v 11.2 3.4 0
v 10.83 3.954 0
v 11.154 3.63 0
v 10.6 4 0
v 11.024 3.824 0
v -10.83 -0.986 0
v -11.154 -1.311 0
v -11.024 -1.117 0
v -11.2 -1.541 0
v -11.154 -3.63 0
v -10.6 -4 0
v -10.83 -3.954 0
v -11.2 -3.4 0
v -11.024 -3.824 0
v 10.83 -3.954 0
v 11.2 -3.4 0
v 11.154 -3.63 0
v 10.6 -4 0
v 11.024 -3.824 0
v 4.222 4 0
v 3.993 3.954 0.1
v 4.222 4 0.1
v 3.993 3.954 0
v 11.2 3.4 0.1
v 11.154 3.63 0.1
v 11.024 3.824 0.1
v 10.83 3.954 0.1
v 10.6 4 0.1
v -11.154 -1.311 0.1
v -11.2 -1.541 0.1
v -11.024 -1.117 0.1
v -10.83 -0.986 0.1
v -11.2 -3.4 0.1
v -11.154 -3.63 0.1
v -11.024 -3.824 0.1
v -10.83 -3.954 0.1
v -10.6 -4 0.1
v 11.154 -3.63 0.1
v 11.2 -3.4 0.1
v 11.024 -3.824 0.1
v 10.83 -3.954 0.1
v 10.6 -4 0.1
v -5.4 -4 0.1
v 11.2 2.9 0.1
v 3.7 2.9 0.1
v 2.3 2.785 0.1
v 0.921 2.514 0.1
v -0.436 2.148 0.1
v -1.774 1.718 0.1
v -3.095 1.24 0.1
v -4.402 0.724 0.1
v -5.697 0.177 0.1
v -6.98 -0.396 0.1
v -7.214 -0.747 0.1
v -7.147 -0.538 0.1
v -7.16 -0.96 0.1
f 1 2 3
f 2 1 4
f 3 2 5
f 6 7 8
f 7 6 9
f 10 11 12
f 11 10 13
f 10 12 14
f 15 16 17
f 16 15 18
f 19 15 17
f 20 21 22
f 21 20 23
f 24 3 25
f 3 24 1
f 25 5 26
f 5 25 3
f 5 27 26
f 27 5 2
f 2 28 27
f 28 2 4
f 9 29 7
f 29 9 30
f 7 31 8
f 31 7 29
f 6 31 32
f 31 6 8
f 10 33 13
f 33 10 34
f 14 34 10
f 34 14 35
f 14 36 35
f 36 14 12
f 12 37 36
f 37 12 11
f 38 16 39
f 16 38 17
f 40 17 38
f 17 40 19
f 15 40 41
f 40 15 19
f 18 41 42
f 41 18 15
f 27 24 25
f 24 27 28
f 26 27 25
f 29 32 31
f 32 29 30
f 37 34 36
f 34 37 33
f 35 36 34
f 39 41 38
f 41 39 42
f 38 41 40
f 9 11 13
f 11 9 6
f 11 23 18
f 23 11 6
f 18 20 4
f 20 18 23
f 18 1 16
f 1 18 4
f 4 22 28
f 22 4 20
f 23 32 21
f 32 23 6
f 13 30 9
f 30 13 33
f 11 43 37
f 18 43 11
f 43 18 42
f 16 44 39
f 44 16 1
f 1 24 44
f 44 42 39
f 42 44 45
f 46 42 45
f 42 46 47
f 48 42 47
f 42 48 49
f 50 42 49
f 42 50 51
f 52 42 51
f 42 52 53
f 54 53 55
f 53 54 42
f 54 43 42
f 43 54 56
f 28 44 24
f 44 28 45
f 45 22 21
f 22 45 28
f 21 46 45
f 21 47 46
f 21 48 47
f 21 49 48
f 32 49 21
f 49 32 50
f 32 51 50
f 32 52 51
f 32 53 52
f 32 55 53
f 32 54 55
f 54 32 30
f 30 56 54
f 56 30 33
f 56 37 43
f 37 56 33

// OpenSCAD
// file: ../p/empty.scad
use <../lib.scad>
function ldraw_lib__empty() = [
// 0 Empty
// 0 Name: empty.dat
// 0 Author: Steffen [Steffen]
// 0 !LDRAW_ORG Primitive UPDATE 2015-01
// 0 !LICENSE Licensed under CC BY 4.0 : see CAreadme.txt
// 
// 0 BFC CERTIFY CCW
  [0,"BFC","CERTIFY"],
  [0,"BFC","CCW"],
// 
// 0 !HISTORY 2015-10-11 [PTadmin] Official Update 2015-01
// 
// 
// 0 // Tool MLCad cannot handle really empty files. This file is used as a workaround.
// 0 // It exceptionally contains forbidden non-LDRAW standard syntax to satisfy MLCad until it is fixed OR a different editor has become the de-facto LDRAW standard.
// 0 // The line being used here is an "impossible" conditional line which never should be visible,
// 0 // additionally hidden by a syntax explicitly hiding it from displaying.
// 
// 0 MLCAD HIDE 5 24 0 0 0 0.0001 0 0 0.0001 -0.0001 0 0 0 0
];
module ldraw_lib__empty(step=0, col=false, unit=2/5, alt=false, line=0.2, solid=!$preview)
    makepoly(ldraw_lib__empty(), step=step, col=col, unit=unit, alt=alt, line=line, solid=solid);
ldraw_lib__empty(line=0.2);
// file: ../p/3-16cyli.scad
use <../lib.scad>
function ldraw_lib__3_16cyli() = [
// 0 Cylinder 0.1875
// 0 Name: 3-16cyli.dat
// 0 Author: Mark Kennedy [mkennedy]
// 0 !LDRAW_ORG Primitive UPDATE 2005-01
// 0 !LICENSE Licensed under CC BY 4.0 : see CAreadme.txt
// 
// 0 BFC CERTIFY CCW
  [0,"BFC","CERTIFY"],
  [0,"BFC","CCW"],
// 
// 0 !HISTORY 2004-03-02 [PTadmin] Official Update 2004-01
// 0 !HISTORY 2004-12-11 [nielsk] Recreated using Primitive Generator, Edge lines fixed, BFC changed to CCW
// 0 !HISTORY 2005-12-28 [PTadmin] Official Update 2005-01
// 0 !HISTORY 2007-06-24 [PTadmin] Header formatted for Contributor Agreement
// 0 !HISTORY 2008-07-01 [PTadmin] Official Update 2008-01
// 
// 
// 4 16 .9239 1 .3827 .9239 0 .3827 1 0 0 1 1 0
  [4,16,.9239,1,.3827,.9239,0,.3827,1,0,0,1,1,0],
// 4 16 .7071 1 .7071 .7071 0 .7071 .9239 0 .3827 .9239 1 .3827
  [4,16,.7071,1,.7071,.7071,0,.7071,.9239,0,.3827,.9239,1,.3827],
// 4 16 .3827 1 .9239 .3827 0 .9239 .7071 0 .7071 .7071 1 .7071
  [4,16,.3827,1,.9239,.3827,0,.9239,.7071,0,.7071,.7071,1,.7071],
// 5 24 1 1 0 1 0 0 1 1 -.4142 .9239 1 .3827
  [5,24,1,1,0,1,0,0,1,1,-.4142,.9239,1,.3827],
// 5 24 .9239 1 .3827 .9239 0 .3827 1 1 0 .7071 1 .7071
  [5,24,.9239,1,.3827,.9239,0,.3827,1,1,0,.7071,1,.7071],
// 5 24 .7071 1 .7071 .7071 0 .7071 .9239 1 .3827 .3827 1 .9239
  [5,24,.7071,1,.7071,.7071,0,.7071,.9239,1,.3827,.3827,1,.9239],
// 5 24 .3827 1 .9239 .3827 0 .9239 .7071 1 .7071 0 1 1.0824
  [5,24,.3827,1,.9239,.3827,0,.9239,.7071,1,.7071,0,1,1.0824],
// 0
];
module ldraw_lib__3_16cyli(step=0, col=false, unit=2/5, alt=false, line=0.2, solid=!$preview)
    makepoly(ldraw_lib__3_16cyli(), step=step, col=col, unit=unit, alt=alt, line=line, solid=solid);
ldraw_lib__3_16cyli(line=0.2);
// file: ../p/3-16chrd.scad
use <../lib.scad>
function ldraw_lib__3_16chrd() = [
// 0 Chord 0.1875
// 0 Name: 3-16chrd.dat
// 0 Author: Niels Karsdorp [nielsk]
// 0 !LDRAW_ORG Primitive UPDATE 2009-01
// 0 !LICENSE Licensed under CC BY 4.0 : see CAreadme.txt
// 
// 0 BFC CERTIFY CCW
  [0,"BFC","CERTIFY"],
  [0,"BFC","CCW"],
// 
// 0 !HISTORY 2009-05-02 [PTadmin] Official Update 2009-01
// 
// 
// 4 16 1 0 0 0.9239 0 0.3827 0.7071 0 0.7071 0.3827 0 0.9239
  [4,16,1,0,0,0.9239,0,0.3827,0.7071,0,0.7071,0.3827,0,0.9239],
// 0
// 
];
module ldraw_lib__3_16chrd(step=0, col=false, unit=2/5, alt=false, line=0.2, solid=!$preview)
    makepoly(ldraw_lib__3_16chrd(), step=step, col=col, unit=unit, alt=alt, line=line, solid=solid);
ldraw_lib__3_16chrd(line=0.2);
// file: ../p/1-4cyli.scad
use <../lib.scad>
function ldraw_lib__1_4cyli() = [
// 0 Cylinder 0.25
// 0 Name: 1-4cyli.dat
// 0 Author: James Jessiman
// 0 !LDRAW_ORG Primitive UPDATE 2012-01
// 0 !LICENSE Licensed under CC BY 4.0 : see CAreadme.txt
// 
// 0 BFC CERTIFY CCW
  [0,"BFC","CERTIFY"],
  [0,"BFC","CCW"],
// 
// 0 !HISTORY 2002-03-23 [sbliss] Added BFC statement.
// 0 !HISTORY 2002-04-25 [PTadmin] Official Update 2002-02
// 0 !HISTORY 2007-06-22 [PTadmin] Header formatted for Contributor Agreement
// 0 !HISTORY 2008-07-01 [PTadmin] Official Update 2008-01
// 0 !HISTORY 2012-02-16 [Philo] Changed to CCW
// 0 !HISTORY 2012-03-30 [PTadmin] Official Update 2012-01
// 
// 
// 4 16 1 1 0 0.9239 1 0.3827 0.9239 0 0.3827 1 0 0
  [4,16,1,1,0,0.9239,1,0.3827,0.9239,0,0.3827,1,0,0],
// 5 24 1 0 0 1 1 0 0.9239 0 0.3827 1 0 -1
  [5,24,1,0,0,1,1,0,0.9239,0,0.3827,1,0,-1],
// 4 16 0.9239 1 0.3827 0.7071 1 0.7071 0.7071 0 0.7071 0.9239 0 0.3827
  [4,16,0.9239,1,0.3827,0.7071,1,0.7071,0.7071,0,0.7071,0.9239,0,0.3827],
// 5 24 0.9239 0 0.3827 0.9239 1 0.3827 0.7071 0 0.7071 1 0 0
  [5,24,0.9239,0,0.3827,0.9239,1,0.3827,0.7071,0,0.7071,1,0,0],
// 4 16 0.7071 1 0.7071 0.3827 1 0.9239 0.3827 0 0.9239 0.7071 0 0.7071
  [4,16,0.7071,1,0.7071,0.3827,1,0.9239,0.3827,0,0.9239,0.7071,0,0.7071],
// 5 24 0.7071 0 0.7071 0.7071 1 0.7071 0.3827 0 0.9239 0.9239 0 0.3827
  [5,24,0.7071,0,0.7071,0.7071,1,0.7071,0.3827,0,0.9239,0.9239,0,0.3827],
// 4 16 0.3827 1 0.9239 0 1 1 0 0 1 0.3827 0 0.9239
  [4,16,0.3827,1,0.9239,0,1,1,0,0,1,0.3827,0,0.9239],
// 5 24 0.3827 0 0.9239 0.3827 1 0.9239 0 0 1 0.7071 0 0.7071
  [5,24,0.3827,0,0.9239,0.3827,1,0.9239,0,0,1,0.7071,0,0.7071],
// 5 24 0 0 1 0 1 1 0.3827 0 0.9239 -1 0 1
  [5,24,0,0,1,0,1,1,0.3827,0,0.9239,-1,0,1],
];
module ldraw_lib__1_4cyli(step=0, col=false, unit=2/5, alt=false, line=0.2, solid=!$preview)
    makepoly(ldraw_lib__1_4cyli(), step=step, col=col, unit=unit, alt=alt, line=line, solid=solid);
ldraw_lib__1_4cyli(line=0.2);
// file: ../p/1-4chrd.scad
use <../lib.scad>
function ldraw_lib__1_4chrd() = [
// 0 Chord 0.25
// 0 Name: 1-4chrd.dat
// 0 Author: Max Martin Richter [MMR1988]
// 0 !LDRAW_ORG Primitive UPDATE 2023-05
// 0 !LICENSE Licensed under CC BY 4.0 : see CAreadme.txt
// 
// 0 BFC CERTIFY CCW
  [0,"BFC","CERTIFY"],
  [0,"BFC","CCW"],
// 
// 0 !HISTORY 2004-04-22 [PTadmin] Official Update 2004-02
// 0 !HISTORY 2007-10-09 [PTadmin] Header formatted for Contributor Agreement
// 0 !HISTORY 2008-07-01 [PTadmin] Official Update 2008-01
// 0 !HISTORY 2012-08-02 [MMR1988] Re-creation with PrimGen2 and Rectifier
// 0 !HISTORY 2012-08-09 [PTadmin] Official Update 2012-02
// 0 !HISTORY 2023-10-27 [OrionP] Change author to MMR1988 from hafhead
// 0 !HISTORY 2023-10-31 [OrionP] Official Update 2023-05
// 
// 4 16 0.9239 0 0.3827 0.3827 0 0.9239 0 0 1 1 0 0
  [4,16,0.9239,0,0.3827,0.3827,0,0.9239,0,0,1,1,0,0],
// 3 16 0.7071 0 0.7071 0.3827 0 0.9239 0.9239 0 0.3827
  [3,16,0.7071,0,0.7071,0.3827,0,0.9239,0.9239,0,0.3827],
];
module ldraw_lib__1_4chrd(step=0, col=false, unit=2/5, alt=false, line=0.2, solid=!$preview)
    makepoly(ldraw_lib__1_4chrd(), step=step, col=col, unit=unit, alt=alt, line=line, solid=solid);
ldraw_lib__1_4chrd(line=0.2);
// file: ../p/1-16cyli.scad
use <../lib.scad>
function ldraw_lib__1_16cyli() = [
// 0 Cylinder 0.0625
// 0 Name: 1-16cyli.dat
// 0 Author: Marc Klein [marckl]
// 0 !LDRAW_ORG Primitive UPDATE 2005-01
// 0 !LICENSE Licensed under CC BY 4.0 : see CAreadme.txt
// 
// 0 BFC CERTIFY CCW
  [0,"BFC","CERTIFY"],
  [0,"BFC","CCW"],
// 
// 0 !HISTORY 2004-03-02 [PTadmin] Official Update 2004-01
// 0 !HISTORY 2004-12-11 [nielsk] Recreated using Primitive Generator, Edge lines fixed, BFC changed to CCW
// 0 !HISTORY 2005-12-28 [PTadmin] Official Update 2005-01
// 0 !HISTORY 2007-06-22 [PTadmin] Header formatted for Contributor Agreement
// 0 !HISTORY 2008-07-01 [PTadmin] Official Update 2008-01
// 
// 
// 4 16 .9239 1 .3827 .9239 0 .3827 1 0 0 1 1 0
  [4,16,.9239,1,.3827,.9239,0,.3827,1,0,0,1,1,0],
// 5 24 1 1 0 1 0 0 1 1 -.4142 .9239 1 .3827
  [5,24,1,1,0,1,0,0,1,1,-.4142,.9239,1,.3827],
// 5 24 .9239 1 .3827 .9239 0 .3827 1 1 0 .7654 1 .7654
  [5,24,.9239,1,.3827,.9239,0,.3827,1,1,0,.7654,1,.7654],
// 0
];
module ldraw_lib__1_16cyli(step=0, col=false, unit=2/5, alt=false, line=0.2, solid=!$preview)
    makepoly(ldraw_lib__1_16cyli(), step=step, col=col, unit=unit, alt=alt, line=line, solid=solid);
ldraw_lib__1_16cyli(line=0.2);
// file: ../p/1-16chrd.scad
use <../lib.scad>
use <empty.scad>
function ldraw_lib__1_16chrd() = [
// 0 Chord 0.0625
// 0 Name: 1-16chrd.dat
// 0 Author: Philippe Hurbain [Philo]
// 0 !LDRAW_ORG Primitive UPDATE 2015-01
// 0 !LICENSE Licensed under CC BY 4.0 : see CAreadme.txt
// 
// 0 BFC CERTIFY CCW
  [0,"BFC","CERTIFY"],
  [0,"BFC","CCW"],
// 
// 0 !HISTORY 2015-10-11 [PTadmin] Official Update 2015-01
// 
// 
// 0 // This file is intentionally empty because at the current \P resolution,
// 0 // an 1-16chrd is actually empty. However, this file still is present
// 0 // to allow tools to do primitives substition and fill in a real chrd here,
// 0 // or, if desired, to substitute this with the hi-res 48\1-16chrd.
// 
// 0 // This file is based on an idea by Darats at http://forums.ldraw.org/read.php?19,14500,14500#msg-14500
// 
// 1 16 0 0 0 1 0 0 0 1 0 0 0 1 empty.dat
  [1,16,0,0,0,1,0,0,0,1,0,0,0,1, ldraw_lib__empty()],
];
module ldraw_lib__1_16chrd(step=0, col=false, unit=2/5, alt=false, line=0.2, solid=!$preview)
    makepoly(ldraw_lib__1_16chrd(), step=step, col=col, unit=unit, alt=alt, line=line, solid=solid);
ldraw_lib__1_16chrd(line=0.2);
// main file
use <../lib.scad>
use <../p/1-16chrd.scad>
use <../p/1-16cyli.scad>
use <../p/1-4chrd.scad>
use <../p/1-4cyli.scad>
use <../p/3-16chrd.scad>
use <../p/3-16cyli.scad>
function ldraw_lib__6141955q() = [
// 0 Sticker  1 x  2.8 with Black Trapezoid on Blue Background Right
// 0 Name: 6141955q.dat
// 0 Author: Massimo Maso [Sirio]
// 0 !LDRAW_ORG Part UPDATE 2025-03
// 0 !LICENSE Licensed under CC BY 4.0 : see CAreadme.txt
// 
// 0 BFC CERTIFY CCW
  [0,"BFC","CERTIFY"],
  [0,"BFC","CCW"],
// 
// 0 !KEYWORDS Bricklink 75871stk01a, Brickowl 197362, Ford, GT, Mustang
// 0 !KEYWORDS Rebrickable 24746, Set 75871, Speed Champions
// 
// 0 !HISTORY 2025-03-30 [OrionP] Official Update 2025-03
// 
// 0 // Primitives
// 1 16 10.55615 0 8.5 0 0 -1.5 0 -1 0 1.5 0 0 1-16chrd.dat
  [1,16,10.55615,0,8.5,0,0,-1.5,0,-1,0,1.5,0,0, ldraw_lib__1_16chrd()],
// 1 16 26.5 0 8.5 1.5 0 0 0 -1 0 0 0 1.5 1-4chrd.dat
  [1,16,26.5,0,8.5,1.5,0,0,0,-1,0,0,0,1.5, ldraw_lib__1_4chrd()],
// 1 16 -26.5 0 -3.85205 -1.5 0 0 0 -1 0 0 0 1.5 3-16chrd.dat
  [1,16,-26.5,0,-3.85205,-1.5,0,0,0,-1,0,0,0,1.5, ldraw_lib__3_16chrd()],
// 1 16 -26.5 0 -8.5 -1.5 0 0 0 -1 0 0 0 -1.5 1-4chrd.dat
  [1,16,-26.5,0,-8.5,-1.5,0,0,0,-1,0,0,0,-1.5, ldraw_lib__1_4chrd()],
// 1 16 26.5 0 -8.5 1.5 0 0 0 -1 0 0 0 -1.5 1-4chrd.dat
  [1,16,26.5,0,-8.5,1.5,0,0,0,-1,0,0,0,-1.5, ldraw_lib__1_4chrd()],
// 1 16 10.55615 0 8.5 0 0 -1.5 0 -.25 0 1.5 0 0 1-16cyli.dat
  [1,16,10.55615,0,8.5,0,0,-1.5,0,-.25,0,1.5,0,0, ldraw_lib__1_16cyli()],
// 1 16 26.5 0 8.5 1.5 0 0 0 -.25 0 0 0 1.5 1-4cyli.dat
  [1,16,26.5,0,8.5,1.5,0,0,0,-.25,0,0,0,1.5, ldraw_lib__1_4cyli()],
// 1 16 -26.5 0 -3.85205 -1.5 0 0 0 -.25 0 0 0 1.5 3-16cyli.dat
  [1,16,-26.5,0,-3.85205,-1.5,0,0,0,-.25,0,0,0,1.5, ldraw_lib__3_16cyli()],
// 1 16 -26.5 0 -8.5 -1.5 0 0 0 -.25 0 0 0 -1.5 1-4cyli.dat
  [1,16,-26.5,0,-8.5,-1.5,0,0,0,-.25,0,0,0,-1.5, ldraw_lib__1_4cyli()],
// 1 16 26.5 0 -8.5 1.5 0 0 0 -.25 0 0 0 -1.5 1-4cyli.dat
  [1,16,26.5,0,-8.5,1.5,0,0,0,-.25,0,0,0,-1.5, ldraw_lib__1_4cyli()],
// 1 1 10.55615 -.25 8.5 0 0 -1.5 0 1 0 1.5 0 0 1-16chrd.dat
  [1,1,10.55615,-.25,8.5,0,0,-1.5,0,1,0,1.5,0,0, ldraw_lib__1_16chrd()],
// 1 1 26.5 -.25 8.5 1.5 0 0 0 1 0 0 0 1.5 1-4chrd.dat
  [1,1,26.5,-.25,8.5,1.5,0,0,0,1,0,0,0,1.5, ldraw_lib__1_4chrd()],
// 1 1 -26.5 -.25 -3.85205 -1.5 0 0 0 1 0 0 0 1.5 3-16chrd.dat
  [1,1,-26.5,-.25,-3.85205,-1.5,0,0,0,1,0,0,0,1.5, ldraw_lib__3_16chrd()],
// 1 1 -26.5 -.25 -8.5 -1.5 0 0 0 1 0 0 0 -1.5 1-4chrd.dat
  [1,1,-26.5,-.25,-8.5,-1.5,0,0,0,1,0,0,0,-1.5, ldraw_lib__1_4chrd()],
// 1 0 26.5 -.25 -8.5 1.5 0 0 0 1 0 0 0 -1.5 1-4chrd.dat
  [1,0,26.5,-.25,-8.5,1.5,0,0,0,1,0,0,0,-1.5, ldraw_lib__1_4chrd()],
// 0 // Bottom face
// 4 16 -26.5 0 -10 -28 0 -8.5 -28 0 -3.85205 -27.07405 0 -2.4662
  [4,16,-26.5,0,-10,-28,0,-8.5,-28,0,-3.85205,-27.07405,0,-2.4662],
// 4 16 -26.5 0 -10 -27.07405 0 -2.4662 9.9821 0 9.88585 26.5 0 -10
  [4,16,-26.5,0,-10,-27.07405,0,-2.4662,9.9821,0,9.88585,26.5,0,-10],
// 4 16 26.5 0 -10 9.9821 0 9.88585 10.55615 0 10 26.5 0 10
  [4,16,26.5,0,-10,9.9821,0,9.88585,10.55615,0,10,26.5,0,10],
// 4 16 26.5 0 -10 26.5 0 10 28 0 8.5 28 0 -8.5
  [4,16,26.5,0,-10,26.5,0,10,28,0,8.5,28,0,-8.5],
// 0 // Lateral face
// 4 16 26.5 0 10 10.55615 0 10 10.55615 -.25 10 26.5 -.25 10
  [4,16,26.5,0,10,10.55615,0,10,10.55615,-.25,10,26.5,-.25,10],
// 4 16 9.9821 0 9.88585 -27.07405 0 -2.4662 -27.07405 -.25 -2.4662 9.9821 -.25 9.88585
  [4,16,9.9821,0,9.88585,-27.07405,0,-2.4662,-27.07405,-.25,-2.4662,9.9821,-.25,9.88585],
// 4 16 -28 0 -3.85205 -28 0 -8.5 -28 -.25 -8.5 -28 -.25 -3.85205
  [4,16,-28,0,-3.85205,-28,0,-8.5,-28,-.25,-8.5,-28,-.25,-3.85205],
// 3 16 -26.5 0 -10 -13.5 -.25 -10 -26.5 -.25 -10
  [3,16,-26.5,0,-10,-13.5,-.25,-10,-26.5,-.25,-10],
// 4 16 -26.5 0 -10 26.5 0 -10 26.5 -.25 -10 -13.5 -.25 -10
  [4,16,-26.5,0,-10,26.5,0,-10,26.5,-.25,-10,-13.5,-.25,-10],
// 4 16 28 0 8.5 28 -.25 7.25 28 -.25 -8.5 28 0 -8.5
  [4,16,28,0,8.5,28,-.25,7.25,28,-.25,-8.5,28,0,-8.5],
// 3 16 28 0 8.5 28 -.25 8.5 28 -.25 7.25
  [3,16,28,0,8.5,28,-.25,8.5,28,-.25,7.25],
// 0 // Conditional lines
// 5 24 9.9821 -.25 9.8859 9.9821 0 9.8859 10.5562 -.25 10 -27.0741 -.25 -2.4662
  [5,24,9.9821,-.25,9.8859,9.9821,0,9.8859,10.5562,-.25,10,-27.0741,-.25,-2.4662],
// 5 24 -27.0741 -.25 -2.4662 -27.0741 0 -2.4662 -27.5607 -.25 -2.7914 9.9821 -.25 9.8859
  [5,24,-27.0741,-.25,-2.4662,-27.0741,0,-2.4662,-27.5607,-.25,-2.7914,9.9821,-.25,9.8859],
// 0 // Top face
// 0 // Black faces
// 4 0 26.5 -.25 -10 28 -.25 -8.5 28 -.25 7.25 9.25 -.25 7.25
  [4,0,26.5,-.25,-10,28,-.25,-8.5,28,-.25,7.25,9.25,-.25,7.25],
// 4 0 26.5 -.25 -10 9.25 -.25 7.25 5.7488 -.25 6.9618 2.3016 -.25 6.2847
  [4,0,26.5,-.25,-10,9.25,-.25,7.25,5.7488,-.25,6.9618,2.3016,-.25,6.2847],
// 4 0 26.5 -.25 -10 2.3016 -.25 6.2847 -1.0907 -.25 5.3712 -4.435 -.25 4.2954
  [4,0,26.5,-.25,-10,2.3016,-.25,6.2847,-1.0907,-.25,5.3712,-4.435,-.25,4.2954],
// 4 0 26.5 -.25 -10 -4.435 -.25 4.2954 -7.7382 -.25 3.0992 -11.0057 -.25 1.8089
  [4,0,26.5,-.25,-10,-4.435,-.25,4.2954,-7.7382,-.25,3.0992,-11.0057,-.25,1.8089],
// 4 0 26.5 -.25 -10 -11.0057 -.25 1.8089 -14.2419 -.25 .4418 -17.4502 -.25 -.9894
  [4,0,26.5,-.25,-10,-11.0057,-.25,1.8089,-14.2419,-.25,.4418,-17.4502,-.25,-.9894],
// 4 0 26.5 -.25 -10 -17.4502 -.25 -.9894 -17.8674 -.25 -1.3455 -18.0341 -.25 -1.8681
  [4,0,26.5,-.25,-10,-17.4502,-.25,-.9894,-17.8674,-.25,-1.3455,-18.0341,-.25,-1.8681],
// 4 0 26.5 -.25 -10 -18.0341 -.25 -1.8681 -17.9 -.25 -2.4 -13.5 -.25 -10
  [4,0,26.5,-.25,-10,-18.0341,-.25,-1.8681,-17.9,-.25,-2.4,-13.5,-.25,-10],
// 0 // Blue faces
// 4 1 26.5 -.25 10 9.25 -.25 7.25 28 -.25 7.25 28 -.25 8.5
  [4,1,26.5,-.25,10,9.25,-.25,7.25,28,-.25,7.25,28,-.25,8.5],
// 4 1 26.5 -.25 10 10.55615 -.25 10 9.9821 -.25 9.88585 9.25 -.25 7.25
  [4,1,26.5,-.25,10,10.55615,-.25,10,9.9821,-.25,9.88585,9.25,-.25,7.25],
// 3 1 9.9821 -.25 9.88585 5.7488 -.25 6.9618 9.25 -.25 7.25
  [3,1,9.9821,-.25,9.88585,5.7488,-.25,6.9618,9.25,-.25,7.25],
// 3 1 9.9821 -.25 9.88585 2.3016 -.25 6.2847 5.7488 -.25 6.9618
  [3,1,9.9821,-.25,9.88585,2.3016,-.25,6.2847,5.7488,-.25,6.9618],
// 3 1 9.9821 -.25 9.88585 -1.0907 -.25 5.3712 2.3016 -.25 6.2847
  [3,1,9.9821,-.25,9.88585,-1.0907,-.25,5.3712,2.3016,-.25,6.2847],
// 3 1 9.9821 -.25 9.88585 -4.435 -.25 4.2954 -1.0907 -.25 5.3712
  [3,1,9.9821,-.25,9.88585,-4.435,-.25,4.2954,-1.0907,-.25,5.3712],
// 4 1 9.9821 -.25 9.88585 -27.07405 -.25 -2.4662 -7.7382 -.25 3.0992 -4.435 -.25 4.2954
  [4,1,9.9821,-.25,9.88585,-27.07405,-.25,-2.4662,-7.7382,-.25,3.0992,-4.435,-.25,4.2954],
// 3 1 -27.07405 -.25 -2.4662 -11.0057 -.25 1.8089 -7.7382 -.25 3.0992
  [3,1,-27.07405,-.25,-2.4662,-11.0057,-.25,1.8089,-7.7382,-.25,3.0992],
// 3 1 -27.07405 -.25 -2.4662 -14.2419 -.25 .4418 -11.0057 -.25 1.8089
  [3,1,-27.07405,-.25,-2.4662,-14.2419,-.25,.4418,-11.0057,-.25,1.8089],
// 3 1 -27.07405 -.25 -2.4662 -17.4502 -.25 -.9894 -14.2419 -.25 .4418
  [3,1,-27.07405,-.25,-2.4662,-17.4502,-.25,-.9894,-14.2419,-.25,.4418],
// 3 1 -27.07405 -.25 -2.4662 -17.8674 -.25 -1.3455 -17.4502 -.25 -.9894
  [3,1,-27.07405,-.25,-2.4662,-17.8674,-.25,-1.3455,-17.4502,-.25,-.9894],
// 4 1 -27.07405 -.25 -2.4662 -28 -.25 -3.85205 -18.0341 -.25 -1.8681 -17.8674 -.25 -1.3455
  [4,1,-27.07405,-.25,-2.4662,-28,-.25,-3.85205,-18.0341,-.25,-1.8681,-17.8674,-.25,-1.3455],
// 4 1 -28 -.25 -8.5 -17.9 -.25 -2.4 -18.0341 -.25 -1.8681 -28 -.25 -3.85205
  [4,1,-28,-.25,-8.5,-17.9,-.25,-2.4,-18.0341,-.25,-1.8681,-28,-.25,-3.85205],
// 4 1 -28 -.25 -8.5 -26.5 -.25 -10 -13.5 -.25 -10 -17.9 -.25 -2.4
  [4,1,-28,-.25,-8.5,-26.5,-.25,-10,-13.5,-.25,-10,-17.9,-.25,-2.4],
];
module ldraw_lib__6141955q(step=0, col=false, unit=2/5, alt=false, line=0.2, solid=!$preview)
    makepoly(ldraw_lib__6141955q(), step=step, col=col, unit=unit, alt=alt, line=line, solid=solid);
ldraw_lib__6141955q(line=0.2);
